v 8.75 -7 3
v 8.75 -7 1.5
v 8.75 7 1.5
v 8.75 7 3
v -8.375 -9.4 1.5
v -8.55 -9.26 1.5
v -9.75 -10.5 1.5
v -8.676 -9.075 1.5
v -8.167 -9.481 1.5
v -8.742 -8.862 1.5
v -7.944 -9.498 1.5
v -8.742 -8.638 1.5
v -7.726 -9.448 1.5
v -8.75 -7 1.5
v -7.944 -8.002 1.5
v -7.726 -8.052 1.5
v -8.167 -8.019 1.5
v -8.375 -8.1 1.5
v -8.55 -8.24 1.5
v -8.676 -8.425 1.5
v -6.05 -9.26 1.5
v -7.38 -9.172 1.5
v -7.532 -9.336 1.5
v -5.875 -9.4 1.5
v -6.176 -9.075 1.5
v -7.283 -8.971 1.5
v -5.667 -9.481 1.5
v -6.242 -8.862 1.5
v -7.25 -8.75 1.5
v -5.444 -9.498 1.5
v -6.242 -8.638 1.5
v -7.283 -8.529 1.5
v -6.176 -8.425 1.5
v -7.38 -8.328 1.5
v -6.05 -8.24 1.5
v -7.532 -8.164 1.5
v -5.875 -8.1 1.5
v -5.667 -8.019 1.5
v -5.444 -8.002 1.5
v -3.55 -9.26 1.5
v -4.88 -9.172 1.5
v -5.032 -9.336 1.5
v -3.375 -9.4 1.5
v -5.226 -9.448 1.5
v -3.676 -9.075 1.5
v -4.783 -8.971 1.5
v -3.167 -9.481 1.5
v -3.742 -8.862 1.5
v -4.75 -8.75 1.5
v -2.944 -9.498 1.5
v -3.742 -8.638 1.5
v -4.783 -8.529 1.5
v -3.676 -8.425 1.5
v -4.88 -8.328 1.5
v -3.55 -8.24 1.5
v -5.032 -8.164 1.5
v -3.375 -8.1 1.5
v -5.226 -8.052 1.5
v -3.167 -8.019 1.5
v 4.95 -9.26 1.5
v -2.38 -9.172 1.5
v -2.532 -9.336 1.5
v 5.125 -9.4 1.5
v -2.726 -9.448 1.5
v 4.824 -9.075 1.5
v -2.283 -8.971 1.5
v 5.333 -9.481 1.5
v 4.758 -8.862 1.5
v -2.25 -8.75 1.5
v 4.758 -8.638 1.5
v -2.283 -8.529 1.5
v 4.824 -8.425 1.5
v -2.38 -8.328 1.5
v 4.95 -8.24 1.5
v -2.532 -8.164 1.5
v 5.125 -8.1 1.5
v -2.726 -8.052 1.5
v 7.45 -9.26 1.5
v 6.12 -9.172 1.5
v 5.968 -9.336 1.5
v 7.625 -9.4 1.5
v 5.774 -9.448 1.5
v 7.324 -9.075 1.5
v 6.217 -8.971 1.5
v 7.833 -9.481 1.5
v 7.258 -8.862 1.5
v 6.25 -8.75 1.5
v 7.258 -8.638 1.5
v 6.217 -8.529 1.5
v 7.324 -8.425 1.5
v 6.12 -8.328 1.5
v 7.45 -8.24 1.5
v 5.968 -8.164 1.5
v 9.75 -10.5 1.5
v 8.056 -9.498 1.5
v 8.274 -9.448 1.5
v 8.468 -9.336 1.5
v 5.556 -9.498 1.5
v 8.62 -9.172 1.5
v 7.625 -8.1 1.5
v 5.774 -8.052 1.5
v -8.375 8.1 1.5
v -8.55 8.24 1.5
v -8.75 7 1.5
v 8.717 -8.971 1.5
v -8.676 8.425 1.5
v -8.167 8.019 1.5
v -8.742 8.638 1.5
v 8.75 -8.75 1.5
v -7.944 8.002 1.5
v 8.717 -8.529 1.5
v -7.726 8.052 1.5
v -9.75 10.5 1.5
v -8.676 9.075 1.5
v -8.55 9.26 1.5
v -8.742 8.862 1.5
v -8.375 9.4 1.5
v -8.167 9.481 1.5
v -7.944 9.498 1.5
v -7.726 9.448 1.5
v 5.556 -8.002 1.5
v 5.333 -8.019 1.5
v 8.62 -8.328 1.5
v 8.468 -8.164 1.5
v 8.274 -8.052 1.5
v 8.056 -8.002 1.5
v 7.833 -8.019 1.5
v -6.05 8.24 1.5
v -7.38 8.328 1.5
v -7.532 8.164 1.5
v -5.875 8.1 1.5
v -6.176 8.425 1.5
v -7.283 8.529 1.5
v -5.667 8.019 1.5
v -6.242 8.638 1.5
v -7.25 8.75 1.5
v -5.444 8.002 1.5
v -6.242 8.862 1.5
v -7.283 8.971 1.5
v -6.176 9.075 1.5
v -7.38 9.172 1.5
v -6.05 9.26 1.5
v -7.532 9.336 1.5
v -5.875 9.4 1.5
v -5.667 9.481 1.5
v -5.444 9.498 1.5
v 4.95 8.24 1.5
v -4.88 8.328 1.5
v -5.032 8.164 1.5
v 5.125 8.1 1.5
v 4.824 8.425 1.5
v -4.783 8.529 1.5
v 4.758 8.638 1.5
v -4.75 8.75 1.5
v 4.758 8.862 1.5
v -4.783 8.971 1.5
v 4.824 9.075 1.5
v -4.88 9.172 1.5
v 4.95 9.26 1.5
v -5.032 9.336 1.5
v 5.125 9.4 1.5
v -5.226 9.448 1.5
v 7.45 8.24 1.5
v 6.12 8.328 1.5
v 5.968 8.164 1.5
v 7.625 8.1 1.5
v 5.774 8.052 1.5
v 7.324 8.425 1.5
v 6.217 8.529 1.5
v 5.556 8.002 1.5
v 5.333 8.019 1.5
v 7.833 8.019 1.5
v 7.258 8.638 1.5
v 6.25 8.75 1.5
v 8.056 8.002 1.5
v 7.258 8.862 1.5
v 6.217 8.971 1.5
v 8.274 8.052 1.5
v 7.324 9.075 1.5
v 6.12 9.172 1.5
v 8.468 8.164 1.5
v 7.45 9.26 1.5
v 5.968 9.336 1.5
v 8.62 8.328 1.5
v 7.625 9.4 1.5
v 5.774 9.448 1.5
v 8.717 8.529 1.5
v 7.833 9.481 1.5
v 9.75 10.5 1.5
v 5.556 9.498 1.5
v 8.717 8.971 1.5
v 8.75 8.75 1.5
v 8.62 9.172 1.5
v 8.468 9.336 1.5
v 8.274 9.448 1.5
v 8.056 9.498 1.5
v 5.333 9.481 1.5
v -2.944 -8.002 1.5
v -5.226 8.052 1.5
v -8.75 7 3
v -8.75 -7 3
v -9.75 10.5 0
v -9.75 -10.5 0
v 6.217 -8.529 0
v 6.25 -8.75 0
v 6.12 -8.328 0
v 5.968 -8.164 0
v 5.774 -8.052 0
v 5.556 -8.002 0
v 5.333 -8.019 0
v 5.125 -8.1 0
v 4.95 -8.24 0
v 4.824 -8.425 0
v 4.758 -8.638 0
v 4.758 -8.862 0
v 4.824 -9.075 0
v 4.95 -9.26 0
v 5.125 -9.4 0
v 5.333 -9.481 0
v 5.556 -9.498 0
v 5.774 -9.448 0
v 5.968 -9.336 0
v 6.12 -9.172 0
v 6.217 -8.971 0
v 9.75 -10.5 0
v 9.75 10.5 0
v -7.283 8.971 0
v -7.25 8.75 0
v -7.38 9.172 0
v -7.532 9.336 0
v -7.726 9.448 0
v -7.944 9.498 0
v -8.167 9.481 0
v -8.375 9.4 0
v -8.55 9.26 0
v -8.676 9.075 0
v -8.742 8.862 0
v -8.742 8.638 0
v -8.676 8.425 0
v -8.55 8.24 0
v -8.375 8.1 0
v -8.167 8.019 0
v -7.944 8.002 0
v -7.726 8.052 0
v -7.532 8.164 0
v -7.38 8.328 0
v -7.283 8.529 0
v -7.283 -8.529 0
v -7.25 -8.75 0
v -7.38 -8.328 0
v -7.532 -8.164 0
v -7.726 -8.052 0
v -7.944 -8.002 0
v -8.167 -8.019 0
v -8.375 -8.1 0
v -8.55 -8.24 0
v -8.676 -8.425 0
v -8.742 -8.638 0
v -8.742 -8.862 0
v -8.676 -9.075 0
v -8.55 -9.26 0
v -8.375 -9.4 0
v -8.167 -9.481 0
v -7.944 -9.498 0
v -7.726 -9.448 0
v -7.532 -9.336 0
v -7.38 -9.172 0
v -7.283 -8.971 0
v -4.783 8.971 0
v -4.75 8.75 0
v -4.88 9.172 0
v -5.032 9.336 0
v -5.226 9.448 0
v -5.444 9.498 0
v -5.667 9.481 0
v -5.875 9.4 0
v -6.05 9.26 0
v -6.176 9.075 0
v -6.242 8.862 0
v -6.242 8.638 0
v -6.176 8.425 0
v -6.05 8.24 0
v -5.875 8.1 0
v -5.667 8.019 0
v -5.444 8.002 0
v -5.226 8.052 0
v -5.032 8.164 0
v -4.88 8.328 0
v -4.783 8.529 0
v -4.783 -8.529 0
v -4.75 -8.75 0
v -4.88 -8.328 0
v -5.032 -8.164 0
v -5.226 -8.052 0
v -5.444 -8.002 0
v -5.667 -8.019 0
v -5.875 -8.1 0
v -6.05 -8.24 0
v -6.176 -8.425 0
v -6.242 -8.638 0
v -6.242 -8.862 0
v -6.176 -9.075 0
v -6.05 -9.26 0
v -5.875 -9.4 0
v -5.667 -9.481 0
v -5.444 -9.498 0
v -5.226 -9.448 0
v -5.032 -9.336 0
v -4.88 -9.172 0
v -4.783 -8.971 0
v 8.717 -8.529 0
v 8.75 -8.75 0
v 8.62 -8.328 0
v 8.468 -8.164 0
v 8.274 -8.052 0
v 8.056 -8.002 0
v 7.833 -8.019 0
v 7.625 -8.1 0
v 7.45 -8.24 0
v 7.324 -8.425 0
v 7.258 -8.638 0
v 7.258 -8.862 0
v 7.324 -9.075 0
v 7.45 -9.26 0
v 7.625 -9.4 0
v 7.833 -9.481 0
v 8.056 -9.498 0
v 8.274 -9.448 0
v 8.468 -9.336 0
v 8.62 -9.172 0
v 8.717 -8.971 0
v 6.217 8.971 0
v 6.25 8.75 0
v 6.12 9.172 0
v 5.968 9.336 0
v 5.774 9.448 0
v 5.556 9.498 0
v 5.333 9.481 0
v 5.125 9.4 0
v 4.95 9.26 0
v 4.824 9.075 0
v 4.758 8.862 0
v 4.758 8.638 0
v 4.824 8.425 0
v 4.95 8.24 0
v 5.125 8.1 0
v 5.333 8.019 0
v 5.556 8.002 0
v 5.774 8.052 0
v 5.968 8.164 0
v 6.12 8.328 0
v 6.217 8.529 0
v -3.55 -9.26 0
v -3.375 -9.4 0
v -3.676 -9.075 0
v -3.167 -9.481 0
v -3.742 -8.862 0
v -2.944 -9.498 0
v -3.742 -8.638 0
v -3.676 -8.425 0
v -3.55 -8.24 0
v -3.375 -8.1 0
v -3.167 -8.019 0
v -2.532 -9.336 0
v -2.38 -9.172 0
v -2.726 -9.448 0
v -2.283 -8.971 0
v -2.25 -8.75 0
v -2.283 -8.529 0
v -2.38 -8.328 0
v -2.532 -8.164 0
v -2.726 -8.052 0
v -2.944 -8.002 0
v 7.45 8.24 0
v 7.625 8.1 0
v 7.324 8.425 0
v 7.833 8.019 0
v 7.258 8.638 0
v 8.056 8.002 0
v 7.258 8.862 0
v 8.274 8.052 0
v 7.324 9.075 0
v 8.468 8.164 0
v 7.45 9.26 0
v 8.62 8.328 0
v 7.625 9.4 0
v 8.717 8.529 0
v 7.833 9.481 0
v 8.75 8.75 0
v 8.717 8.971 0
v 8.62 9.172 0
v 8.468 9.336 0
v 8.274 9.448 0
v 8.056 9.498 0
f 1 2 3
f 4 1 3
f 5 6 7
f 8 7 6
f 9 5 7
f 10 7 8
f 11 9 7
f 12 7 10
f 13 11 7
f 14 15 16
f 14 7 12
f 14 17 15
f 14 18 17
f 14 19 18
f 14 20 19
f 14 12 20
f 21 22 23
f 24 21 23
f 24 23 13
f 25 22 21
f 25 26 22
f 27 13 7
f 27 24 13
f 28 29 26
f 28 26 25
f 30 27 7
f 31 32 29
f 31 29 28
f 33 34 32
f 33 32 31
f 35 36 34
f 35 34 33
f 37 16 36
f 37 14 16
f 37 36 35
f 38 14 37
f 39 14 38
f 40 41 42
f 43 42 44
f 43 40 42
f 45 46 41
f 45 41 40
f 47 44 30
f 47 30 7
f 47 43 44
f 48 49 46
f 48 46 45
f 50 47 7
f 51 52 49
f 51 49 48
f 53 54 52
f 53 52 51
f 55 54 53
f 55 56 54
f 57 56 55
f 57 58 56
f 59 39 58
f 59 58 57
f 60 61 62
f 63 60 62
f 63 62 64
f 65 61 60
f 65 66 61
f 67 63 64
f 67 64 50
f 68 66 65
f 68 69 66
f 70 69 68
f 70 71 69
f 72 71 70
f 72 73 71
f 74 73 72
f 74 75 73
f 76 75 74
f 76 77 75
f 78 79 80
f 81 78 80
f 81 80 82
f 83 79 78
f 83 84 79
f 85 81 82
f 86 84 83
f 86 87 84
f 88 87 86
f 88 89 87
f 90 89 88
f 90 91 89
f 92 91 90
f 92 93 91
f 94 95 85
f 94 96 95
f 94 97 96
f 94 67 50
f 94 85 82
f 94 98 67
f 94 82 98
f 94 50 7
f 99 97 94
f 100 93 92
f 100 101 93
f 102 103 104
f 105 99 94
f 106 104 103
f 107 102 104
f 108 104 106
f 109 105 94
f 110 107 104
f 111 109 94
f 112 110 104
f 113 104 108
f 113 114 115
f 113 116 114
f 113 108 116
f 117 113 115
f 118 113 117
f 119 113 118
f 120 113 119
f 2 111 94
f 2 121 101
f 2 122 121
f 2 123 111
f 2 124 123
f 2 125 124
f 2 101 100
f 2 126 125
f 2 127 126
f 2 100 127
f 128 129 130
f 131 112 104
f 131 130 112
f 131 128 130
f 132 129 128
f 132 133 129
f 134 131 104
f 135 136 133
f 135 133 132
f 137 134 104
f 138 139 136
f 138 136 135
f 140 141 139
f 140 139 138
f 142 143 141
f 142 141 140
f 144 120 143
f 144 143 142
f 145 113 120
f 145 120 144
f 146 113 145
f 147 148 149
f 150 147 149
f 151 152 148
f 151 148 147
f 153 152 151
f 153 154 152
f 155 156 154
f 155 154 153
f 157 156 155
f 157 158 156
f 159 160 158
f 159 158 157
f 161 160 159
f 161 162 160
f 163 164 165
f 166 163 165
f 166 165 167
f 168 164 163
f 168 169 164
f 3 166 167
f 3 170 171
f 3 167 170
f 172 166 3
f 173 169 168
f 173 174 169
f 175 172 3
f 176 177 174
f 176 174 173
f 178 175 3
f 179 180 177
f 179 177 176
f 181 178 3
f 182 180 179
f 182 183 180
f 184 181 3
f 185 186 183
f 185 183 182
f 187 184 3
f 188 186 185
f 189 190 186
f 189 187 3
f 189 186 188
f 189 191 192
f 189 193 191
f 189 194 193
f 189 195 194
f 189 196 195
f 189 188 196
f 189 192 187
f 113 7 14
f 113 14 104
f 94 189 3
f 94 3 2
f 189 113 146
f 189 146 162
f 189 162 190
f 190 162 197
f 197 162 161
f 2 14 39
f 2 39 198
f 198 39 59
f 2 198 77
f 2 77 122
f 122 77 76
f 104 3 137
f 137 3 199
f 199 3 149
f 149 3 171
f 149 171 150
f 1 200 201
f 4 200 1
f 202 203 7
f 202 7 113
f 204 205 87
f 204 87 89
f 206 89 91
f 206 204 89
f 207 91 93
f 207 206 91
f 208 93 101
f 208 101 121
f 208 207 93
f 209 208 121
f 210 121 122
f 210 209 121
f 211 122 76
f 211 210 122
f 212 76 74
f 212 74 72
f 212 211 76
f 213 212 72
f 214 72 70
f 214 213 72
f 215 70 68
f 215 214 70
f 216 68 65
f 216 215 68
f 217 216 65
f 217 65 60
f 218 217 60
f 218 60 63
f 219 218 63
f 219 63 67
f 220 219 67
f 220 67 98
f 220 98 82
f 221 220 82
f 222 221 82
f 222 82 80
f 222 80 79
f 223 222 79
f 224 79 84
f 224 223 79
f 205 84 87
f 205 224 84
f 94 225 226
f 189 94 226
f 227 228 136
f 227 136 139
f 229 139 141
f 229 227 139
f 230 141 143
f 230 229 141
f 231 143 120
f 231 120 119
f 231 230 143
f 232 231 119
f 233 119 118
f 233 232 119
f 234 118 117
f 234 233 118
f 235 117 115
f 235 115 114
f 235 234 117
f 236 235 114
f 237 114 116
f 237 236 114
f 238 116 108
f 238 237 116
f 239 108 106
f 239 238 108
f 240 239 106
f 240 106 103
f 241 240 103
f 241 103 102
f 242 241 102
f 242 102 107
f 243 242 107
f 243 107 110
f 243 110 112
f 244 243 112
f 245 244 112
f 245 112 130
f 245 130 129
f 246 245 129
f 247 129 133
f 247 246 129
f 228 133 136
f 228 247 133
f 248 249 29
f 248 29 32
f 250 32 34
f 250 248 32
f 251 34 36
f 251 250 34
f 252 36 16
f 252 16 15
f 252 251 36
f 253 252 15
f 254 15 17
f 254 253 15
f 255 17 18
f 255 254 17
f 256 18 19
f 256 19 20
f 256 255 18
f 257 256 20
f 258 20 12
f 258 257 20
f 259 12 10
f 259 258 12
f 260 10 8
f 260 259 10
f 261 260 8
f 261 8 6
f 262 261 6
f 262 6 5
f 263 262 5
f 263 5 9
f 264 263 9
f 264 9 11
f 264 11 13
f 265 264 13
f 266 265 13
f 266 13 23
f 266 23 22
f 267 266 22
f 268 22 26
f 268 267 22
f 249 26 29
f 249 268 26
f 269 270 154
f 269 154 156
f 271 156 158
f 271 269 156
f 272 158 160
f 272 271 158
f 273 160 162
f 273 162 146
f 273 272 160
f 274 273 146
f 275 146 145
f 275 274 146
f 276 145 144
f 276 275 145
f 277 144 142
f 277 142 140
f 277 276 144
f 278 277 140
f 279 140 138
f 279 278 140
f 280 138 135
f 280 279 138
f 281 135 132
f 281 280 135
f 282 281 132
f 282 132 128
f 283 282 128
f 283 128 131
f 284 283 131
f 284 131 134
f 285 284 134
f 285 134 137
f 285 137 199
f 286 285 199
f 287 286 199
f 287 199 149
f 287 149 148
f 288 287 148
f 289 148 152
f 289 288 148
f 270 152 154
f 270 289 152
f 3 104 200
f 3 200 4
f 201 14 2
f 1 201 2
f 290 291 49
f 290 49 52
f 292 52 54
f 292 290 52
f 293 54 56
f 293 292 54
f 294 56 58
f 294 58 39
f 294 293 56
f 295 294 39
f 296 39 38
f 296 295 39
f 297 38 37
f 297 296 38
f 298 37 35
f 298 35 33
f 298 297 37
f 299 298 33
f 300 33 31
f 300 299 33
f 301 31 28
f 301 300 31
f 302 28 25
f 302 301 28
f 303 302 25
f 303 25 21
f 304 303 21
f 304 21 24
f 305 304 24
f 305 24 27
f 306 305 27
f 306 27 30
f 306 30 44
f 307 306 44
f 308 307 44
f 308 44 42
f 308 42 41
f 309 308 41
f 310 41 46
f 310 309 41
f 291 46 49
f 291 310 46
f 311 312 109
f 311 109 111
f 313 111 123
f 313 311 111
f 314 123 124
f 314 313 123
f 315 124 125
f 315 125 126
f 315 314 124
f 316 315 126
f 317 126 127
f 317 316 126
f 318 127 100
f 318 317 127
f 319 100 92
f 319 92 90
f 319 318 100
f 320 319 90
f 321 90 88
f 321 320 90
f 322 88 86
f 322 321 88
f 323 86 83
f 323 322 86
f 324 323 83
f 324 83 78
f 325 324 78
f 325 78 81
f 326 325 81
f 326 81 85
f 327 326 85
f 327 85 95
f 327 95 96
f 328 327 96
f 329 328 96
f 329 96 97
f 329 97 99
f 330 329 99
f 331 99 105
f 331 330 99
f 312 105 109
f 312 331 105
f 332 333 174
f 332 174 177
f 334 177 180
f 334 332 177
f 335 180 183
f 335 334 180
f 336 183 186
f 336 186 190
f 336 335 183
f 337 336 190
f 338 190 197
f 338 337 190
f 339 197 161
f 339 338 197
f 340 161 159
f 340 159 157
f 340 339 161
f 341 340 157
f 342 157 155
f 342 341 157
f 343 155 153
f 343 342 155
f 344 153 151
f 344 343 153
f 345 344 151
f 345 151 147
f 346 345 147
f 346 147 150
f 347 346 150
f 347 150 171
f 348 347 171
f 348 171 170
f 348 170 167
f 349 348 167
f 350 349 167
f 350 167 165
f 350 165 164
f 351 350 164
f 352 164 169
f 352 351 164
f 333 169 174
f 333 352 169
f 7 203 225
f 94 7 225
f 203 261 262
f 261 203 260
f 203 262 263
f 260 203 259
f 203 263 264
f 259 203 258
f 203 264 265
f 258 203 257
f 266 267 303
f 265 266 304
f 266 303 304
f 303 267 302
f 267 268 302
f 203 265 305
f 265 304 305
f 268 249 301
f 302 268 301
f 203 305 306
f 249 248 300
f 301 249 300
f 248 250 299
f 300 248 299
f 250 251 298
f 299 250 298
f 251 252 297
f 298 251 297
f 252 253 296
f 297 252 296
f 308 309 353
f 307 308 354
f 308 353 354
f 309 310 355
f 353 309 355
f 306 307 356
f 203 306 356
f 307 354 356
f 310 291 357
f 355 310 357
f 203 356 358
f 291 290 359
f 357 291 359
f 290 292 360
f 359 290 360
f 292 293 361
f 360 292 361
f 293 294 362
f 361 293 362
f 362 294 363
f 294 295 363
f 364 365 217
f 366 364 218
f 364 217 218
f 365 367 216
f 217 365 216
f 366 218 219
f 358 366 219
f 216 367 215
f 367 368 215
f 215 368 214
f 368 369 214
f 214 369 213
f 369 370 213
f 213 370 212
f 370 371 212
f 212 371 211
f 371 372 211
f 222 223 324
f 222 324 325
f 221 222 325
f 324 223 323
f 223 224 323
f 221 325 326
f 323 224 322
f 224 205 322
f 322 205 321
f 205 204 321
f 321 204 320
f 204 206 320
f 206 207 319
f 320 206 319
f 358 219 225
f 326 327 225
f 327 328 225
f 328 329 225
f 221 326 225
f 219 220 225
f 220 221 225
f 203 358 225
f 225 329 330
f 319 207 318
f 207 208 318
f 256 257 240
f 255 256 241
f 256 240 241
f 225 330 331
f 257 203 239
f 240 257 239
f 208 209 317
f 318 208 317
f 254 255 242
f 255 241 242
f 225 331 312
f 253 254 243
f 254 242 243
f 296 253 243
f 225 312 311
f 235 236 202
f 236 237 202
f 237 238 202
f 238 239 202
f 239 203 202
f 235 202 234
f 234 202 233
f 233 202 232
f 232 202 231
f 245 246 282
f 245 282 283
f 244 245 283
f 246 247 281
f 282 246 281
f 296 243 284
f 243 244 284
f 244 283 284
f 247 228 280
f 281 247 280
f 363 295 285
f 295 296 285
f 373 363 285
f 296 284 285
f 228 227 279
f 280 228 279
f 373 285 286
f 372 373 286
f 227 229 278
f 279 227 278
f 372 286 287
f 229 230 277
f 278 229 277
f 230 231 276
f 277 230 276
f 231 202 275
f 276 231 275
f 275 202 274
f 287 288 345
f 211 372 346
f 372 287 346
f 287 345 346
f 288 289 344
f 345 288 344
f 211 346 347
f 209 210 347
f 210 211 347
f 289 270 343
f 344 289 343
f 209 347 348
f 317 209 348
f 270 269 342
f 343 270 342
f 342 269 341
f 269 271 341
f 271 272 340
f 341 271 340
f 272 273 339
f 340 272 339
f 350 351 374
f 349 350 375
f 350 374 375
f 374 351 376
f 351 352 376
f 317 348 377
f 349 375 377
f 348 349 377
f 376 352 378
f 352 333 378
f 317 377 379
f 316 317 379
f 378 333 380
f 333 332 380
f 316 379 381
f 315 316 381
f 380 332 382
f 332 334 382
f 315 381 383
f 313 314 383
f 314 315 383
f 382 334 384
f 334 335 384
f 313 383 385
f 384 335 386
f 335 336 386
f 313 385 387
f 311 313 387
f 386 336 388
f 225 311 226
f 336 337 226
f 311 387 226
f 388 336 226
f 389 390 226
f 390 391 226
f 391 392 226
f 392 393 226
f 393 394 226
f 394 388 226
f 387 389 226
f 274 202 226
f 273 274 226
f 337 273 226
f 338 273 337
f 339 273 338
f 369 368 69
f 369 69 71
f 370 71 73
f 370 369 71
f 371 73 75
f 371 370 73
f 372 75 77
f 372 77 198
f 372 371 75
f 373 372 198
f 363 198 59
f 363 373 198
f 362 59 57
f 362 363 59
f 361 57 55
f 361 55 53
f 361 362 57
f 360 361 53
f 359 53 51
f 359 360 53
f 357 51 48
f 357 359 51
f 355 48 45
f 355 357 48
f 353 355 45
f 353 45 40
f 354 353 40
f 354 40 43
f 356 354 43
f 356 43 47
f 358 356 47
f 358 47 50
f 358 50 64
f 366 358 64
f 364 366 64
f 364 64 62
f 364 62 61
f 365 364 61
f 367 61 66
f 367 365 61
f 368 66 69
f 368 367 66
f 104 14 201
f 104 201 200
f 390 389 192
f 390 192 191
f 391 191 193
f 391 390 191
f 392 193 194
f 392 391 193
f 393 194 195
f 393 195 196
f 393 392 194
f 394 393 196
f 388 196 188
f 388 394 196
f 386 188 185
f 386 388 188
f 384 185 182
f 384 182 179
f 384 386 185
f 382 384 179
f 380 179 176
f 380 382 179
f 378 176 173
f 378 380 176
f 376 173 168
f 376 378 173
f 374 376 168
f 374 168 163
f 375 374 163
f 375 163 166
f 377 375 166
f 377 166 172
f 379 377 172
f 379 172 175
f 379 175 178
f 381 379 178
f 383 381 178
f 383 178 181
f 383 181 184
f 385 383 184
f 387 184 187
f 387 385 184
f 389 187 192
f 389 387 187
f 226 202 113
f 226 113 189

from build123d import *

# Parameters (mm, degrees)
F0_W     = 19.5
F0_H     = 21
F0_R     = 0.75
F0_W_2   = 17.5
F0_H_2   = 14
F1_DEPTH = 1.5
F2_DEPTH = 3


with BuildPart() as f1:
    # F0 (on Top) → F1 (new body)
    with BuildSketch(Plane.XY):
        Rectangle(F0_W, F0_H)
        with Locations((-8, -8.75)):
            Circle(F0_R, mode=Mode.SUBTRACT)
        with Locations((-5.5, -8.75)):
            Circle(F0_R, mode=Mode.SUBTRACT)
        with Locations((-3, -8.75)):
            Circle(F0_R, mode=Mode.SUBTRACT)
        with Locations((5.5, -8.75)):
            Circle(F0_R, mode=Mode.SUBTRACT)
        with Locations((8, -8.75)):
            Circle(F0_R, mode=Mode.SUBTRACT)
        with Locations((-8, 8.75)):
            Circle(F0_R, mode=Mode.SUBTRACT)
        with Locations((-5.5, 8.75)):
            Circle(F0_R, mode=Mode.SUBTRACT)
        Rectangle(F0_W_2, F0_H_2, mode=Mode.SUBTRACT)
        with Locations((5.5, 8.75)):
            Circle(F0_R, mode=Mode.SUBTRACT)
        with Locations((8, 8.75)):
            Circle(F0_R, mode=Mode.SUBTRACT)
    extrude(amount=F1_DEPTH)

    # F0 (on Top) → F2 (join)
    with BuildSketch(Plane.XY):
        Rectangle(F0_W_2, F0_H_2)
    extrude(amount=F2_DEPTH)


solid = f1.part
